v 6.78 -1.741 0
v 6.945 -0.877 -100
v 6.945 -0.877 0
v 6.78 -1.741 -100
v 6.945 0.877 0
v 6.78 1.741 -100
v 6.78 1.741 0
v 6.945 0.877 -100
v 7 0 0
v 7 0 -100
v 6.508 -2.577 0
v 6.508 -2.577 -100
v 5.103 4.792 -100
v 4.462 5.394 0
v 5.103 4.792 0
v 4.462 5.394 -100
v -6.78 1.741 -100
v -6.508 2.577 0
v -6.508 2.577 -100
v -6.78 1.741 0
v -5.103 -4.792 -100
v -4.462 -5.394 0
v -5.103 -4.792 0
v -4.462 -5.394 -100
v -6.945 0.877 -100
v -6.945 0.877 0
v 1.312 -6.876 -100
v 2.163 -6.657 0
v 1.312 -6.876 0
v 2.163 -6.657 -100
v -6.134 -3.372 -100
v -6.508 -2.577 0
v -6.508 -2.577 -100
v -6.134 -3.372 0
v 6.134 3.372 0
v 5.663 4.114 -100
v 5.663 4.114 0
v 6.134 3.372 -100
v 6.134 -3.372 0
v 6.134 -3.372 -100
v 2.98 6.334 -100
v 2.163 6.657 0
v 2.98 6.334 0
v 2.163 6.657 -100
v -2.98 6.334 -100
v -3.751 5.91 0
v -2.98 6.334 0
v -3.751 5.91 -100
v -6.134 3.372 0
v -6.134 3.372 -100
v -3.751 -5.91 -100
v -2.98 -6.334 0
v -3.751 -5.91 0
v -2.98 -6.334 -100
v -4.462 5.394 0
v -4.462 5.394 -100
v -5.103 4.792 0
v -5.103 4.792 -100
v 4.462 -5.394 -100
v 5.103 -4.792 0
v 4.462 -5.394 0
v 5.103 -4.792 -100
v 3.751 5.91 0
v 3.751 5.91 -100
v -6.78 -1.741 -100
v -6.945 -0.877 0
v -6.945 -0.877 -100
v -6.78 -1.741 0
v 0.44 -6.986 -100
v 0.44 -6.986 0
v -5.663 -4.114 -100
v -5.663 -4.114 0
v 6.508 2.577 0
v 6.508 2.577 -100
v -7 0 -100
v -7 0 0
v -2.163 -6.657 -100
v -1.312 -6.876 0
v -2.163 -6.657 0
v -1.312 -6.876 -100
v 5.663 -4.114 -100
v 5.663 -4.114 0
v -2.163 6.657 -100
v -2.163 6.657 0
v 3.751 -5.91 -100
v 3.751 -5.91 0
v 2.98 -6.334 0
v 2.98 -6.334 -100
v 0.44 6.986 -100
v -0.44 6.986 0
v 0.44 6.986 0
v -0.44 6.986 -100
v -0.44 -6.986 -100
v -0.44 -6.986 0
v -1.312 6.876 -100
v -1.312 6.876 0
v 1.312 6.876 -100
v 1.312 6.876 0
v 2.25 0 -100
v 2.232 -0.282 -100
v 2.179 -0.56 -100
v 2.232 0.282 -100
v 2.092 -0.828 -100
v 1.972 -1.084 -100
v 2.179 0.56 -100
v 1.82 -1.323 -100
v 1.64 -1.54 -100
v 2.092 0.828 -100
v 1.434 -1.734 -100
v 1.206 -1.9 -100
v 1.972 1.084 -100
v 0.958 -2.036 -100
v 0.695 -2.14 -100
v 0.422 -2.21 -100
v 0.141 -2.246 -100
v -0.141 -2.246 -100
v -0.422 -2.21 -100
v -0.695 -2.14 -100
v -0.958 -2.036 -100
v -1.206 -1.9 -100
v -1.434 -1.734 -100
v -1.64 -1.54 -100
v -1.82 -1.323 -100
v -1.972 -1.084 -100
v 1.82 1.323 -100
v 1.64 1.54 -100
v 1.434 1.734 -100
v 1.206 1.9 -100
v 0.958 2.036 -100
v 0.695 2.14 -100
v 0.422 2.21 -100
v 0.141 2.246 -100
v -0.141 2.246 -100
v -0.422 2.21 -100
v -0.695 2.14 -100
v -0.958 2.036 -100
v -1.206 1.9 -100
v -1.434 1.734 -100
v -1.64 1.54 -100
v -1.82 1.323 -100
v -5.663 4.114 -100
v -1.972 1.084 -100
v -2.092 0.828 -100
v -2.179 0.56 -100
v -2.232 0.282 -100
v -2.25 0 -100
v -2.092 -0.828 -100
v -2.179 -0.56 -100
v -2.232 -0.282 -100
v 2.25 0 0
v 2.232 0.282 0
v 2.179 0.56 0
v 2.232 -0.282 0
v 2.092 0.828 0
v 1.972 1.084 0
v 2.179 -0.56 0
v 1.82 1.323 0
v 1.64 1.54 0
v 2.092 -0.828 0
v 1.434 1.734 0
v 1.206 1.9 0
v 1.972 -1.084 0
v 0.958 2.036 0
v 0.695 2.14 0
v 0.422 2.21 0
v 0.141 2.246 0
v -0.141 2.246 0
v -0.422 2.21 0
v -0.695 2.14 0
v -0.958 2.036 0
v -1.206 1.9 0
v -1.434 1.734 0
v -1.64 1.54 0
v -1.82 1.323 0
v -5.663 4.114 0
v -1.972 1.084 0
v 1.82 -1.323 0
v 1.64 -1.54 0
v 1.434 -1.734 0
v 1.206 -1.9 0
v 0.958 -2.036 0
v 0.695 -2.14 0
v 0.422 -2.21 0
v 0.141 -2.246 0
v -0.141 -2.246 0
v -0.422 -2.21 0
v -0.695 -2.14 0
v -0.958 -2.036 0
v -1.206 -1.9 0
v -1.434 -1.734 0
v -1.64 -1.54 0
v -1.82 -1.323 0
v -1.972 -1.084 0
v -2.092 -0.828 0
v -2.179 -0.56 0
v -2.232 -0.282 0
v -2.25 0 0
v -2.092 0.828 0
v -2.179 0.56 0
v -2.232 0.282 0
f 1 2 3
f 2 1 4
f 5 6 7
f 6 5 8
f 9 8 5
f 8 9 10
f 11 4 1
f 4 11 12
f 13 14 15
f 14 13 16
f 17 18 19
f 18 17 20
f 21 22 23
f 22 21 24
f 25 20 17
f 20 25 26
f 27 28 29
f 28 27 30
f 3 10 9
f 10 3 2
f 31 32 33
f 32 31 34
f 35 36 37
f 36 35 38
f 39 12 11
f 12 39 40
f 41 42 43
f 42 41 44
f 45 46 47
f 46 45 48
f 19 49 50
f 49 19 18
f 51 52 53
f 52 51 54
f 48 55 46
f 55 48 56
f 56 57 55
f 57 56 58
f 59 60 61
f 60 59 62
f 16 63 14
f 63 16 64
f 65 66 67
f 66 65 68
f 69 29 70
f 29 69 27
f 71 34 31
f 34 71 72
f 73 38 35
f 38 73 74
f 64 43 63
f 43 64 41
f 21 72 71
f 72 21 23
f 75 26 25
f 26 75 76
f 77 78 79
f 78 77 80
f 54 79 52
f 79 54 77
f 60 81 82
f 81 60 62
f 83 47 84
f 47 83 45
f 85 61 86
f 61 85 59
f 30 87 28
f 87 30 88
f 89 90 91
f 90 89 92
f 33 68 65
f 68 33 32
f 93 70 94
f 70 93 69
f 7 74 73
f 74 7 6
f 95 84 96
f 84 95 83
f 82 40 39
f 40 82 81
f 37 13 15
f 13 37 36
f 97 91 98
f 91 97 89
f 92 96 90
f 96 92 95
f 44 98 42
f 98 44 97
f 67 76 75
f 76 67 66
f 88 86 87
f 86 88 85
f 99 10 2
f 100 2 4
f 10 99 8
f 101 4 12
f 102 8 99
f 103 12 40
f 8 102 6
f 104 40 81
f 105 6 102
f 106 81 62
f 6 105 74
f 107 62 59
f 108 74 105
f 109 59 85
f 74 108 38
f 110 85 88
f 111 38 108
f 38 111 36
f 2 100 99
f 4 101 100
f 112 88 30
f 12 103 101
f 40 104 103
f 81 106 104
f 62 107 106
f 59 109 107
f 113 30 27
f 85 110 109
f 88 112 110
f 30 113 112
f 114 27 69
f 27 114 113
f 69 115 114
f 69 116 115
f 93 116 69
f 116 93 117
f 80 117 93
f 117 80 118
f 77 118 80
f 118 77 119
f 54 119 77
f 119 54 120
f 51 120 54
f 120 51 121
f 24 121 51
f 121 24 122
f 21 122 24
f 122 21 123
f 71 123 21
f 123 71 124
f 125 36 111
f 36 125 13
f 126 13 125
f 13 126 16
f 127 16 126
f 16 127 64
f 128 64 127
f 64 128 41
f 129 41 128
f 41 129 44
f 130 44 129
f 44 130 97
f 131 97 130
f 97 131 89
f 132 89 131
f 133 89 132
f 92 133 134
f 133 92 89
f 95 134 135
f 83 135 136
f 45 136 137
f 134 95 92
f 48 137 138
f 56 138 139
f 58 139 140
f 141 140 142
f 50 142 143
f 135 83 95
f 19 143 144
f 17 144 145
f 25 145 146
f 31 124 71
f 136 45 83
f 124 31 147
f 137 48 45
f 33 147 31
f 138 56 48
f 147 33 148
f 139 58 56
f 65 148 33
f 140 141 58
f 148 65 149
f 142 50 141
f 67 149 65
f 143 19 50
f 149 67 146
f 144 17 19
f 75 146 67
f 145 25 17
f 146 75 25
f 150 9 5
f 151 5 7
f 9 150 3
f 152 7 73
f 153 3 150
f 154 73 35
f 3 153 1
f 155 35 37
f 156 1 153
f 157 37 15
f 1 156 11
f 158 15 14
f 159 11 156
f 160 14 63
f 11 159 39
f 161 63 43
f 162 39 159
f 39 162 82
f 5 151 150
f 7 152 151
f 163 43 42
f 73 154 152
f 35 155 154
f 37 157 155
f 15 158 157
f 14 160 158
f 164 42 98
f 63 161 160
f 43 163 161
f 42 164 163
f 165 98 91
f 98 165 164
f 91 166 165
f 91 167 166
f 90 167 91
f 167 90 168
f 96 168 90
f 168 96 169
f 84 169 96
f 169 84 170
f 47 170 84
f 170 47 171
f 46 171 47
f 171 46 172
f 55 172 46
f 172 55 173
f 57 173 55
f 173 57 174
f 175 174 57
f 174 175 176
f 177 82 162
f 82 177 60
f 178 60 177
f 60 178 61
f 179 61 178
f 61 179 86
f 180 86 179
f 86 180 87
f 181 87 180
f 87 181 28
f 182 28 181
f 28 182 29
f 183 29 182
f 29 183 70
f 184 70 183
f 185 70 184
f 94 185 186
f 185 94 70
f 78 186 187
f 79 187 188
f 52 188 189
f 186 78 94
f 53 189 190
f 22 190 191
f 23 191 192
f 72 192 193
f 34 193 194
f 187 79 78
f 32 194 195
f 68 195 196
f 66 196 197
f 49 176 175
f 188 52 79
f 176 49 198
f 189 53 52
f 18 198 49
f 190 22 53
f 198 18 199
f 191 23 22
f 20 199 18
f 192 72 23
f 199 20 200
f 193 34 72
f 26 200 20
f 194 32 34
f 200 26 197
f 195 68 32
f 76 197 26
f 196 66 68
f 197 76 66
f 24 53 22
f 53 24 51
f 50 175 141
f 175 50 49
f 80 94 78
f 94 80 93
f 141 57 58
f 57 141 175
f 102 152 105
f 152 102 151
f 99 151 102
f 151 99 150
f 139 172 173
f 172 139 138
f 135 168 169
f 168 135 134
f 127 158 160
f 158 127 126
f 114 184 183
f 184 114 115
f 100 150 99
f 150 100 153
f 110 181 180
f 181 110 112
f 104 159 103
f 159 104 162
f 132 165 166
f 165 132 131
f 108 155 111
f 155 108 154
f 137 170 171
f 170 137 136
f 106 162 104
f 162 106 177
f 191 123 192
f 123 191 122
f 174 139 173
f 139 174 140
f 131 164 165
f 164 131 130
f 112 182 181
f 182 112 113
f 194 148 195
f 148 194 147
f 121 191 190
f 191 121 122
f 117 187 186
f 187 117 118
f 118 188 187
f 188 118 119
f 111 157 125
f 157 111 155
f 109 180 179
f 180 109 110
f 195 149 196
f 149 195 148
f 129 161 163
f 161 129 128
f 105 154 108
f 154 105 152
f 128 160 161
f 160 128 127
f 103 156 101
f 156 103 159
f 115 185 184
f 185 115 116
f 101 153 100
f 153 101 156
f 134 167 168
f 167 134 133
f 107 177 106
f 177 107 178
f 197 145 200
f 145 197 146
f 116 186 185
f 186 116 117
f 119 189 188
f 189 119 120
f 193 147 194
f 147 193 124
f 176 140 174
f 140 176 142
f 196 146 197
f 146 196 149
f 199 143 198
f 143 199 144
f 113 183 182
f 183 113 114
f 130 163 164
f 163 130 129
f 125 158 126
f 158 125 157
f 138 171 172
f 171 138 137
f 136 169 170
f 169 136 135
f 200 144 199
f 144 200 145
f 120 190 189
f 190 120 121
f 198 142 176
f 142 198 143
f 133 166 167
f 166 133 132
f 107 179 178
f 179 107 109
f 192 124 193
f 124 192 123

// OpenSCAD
$fn = 50;


difference() {
	union() {
		translate(v = [0, 0, -100.0000000000]) {
			cylinder(h = 100, r = 7.0000000000);
		}
		cylinder(h = 0, r = 13.0000000000);
	}
	union() {
		#translate(v = [0, 0, -100]) {
			cylinder(h = 100, r = 2.2500000000);
		}
	}
}
